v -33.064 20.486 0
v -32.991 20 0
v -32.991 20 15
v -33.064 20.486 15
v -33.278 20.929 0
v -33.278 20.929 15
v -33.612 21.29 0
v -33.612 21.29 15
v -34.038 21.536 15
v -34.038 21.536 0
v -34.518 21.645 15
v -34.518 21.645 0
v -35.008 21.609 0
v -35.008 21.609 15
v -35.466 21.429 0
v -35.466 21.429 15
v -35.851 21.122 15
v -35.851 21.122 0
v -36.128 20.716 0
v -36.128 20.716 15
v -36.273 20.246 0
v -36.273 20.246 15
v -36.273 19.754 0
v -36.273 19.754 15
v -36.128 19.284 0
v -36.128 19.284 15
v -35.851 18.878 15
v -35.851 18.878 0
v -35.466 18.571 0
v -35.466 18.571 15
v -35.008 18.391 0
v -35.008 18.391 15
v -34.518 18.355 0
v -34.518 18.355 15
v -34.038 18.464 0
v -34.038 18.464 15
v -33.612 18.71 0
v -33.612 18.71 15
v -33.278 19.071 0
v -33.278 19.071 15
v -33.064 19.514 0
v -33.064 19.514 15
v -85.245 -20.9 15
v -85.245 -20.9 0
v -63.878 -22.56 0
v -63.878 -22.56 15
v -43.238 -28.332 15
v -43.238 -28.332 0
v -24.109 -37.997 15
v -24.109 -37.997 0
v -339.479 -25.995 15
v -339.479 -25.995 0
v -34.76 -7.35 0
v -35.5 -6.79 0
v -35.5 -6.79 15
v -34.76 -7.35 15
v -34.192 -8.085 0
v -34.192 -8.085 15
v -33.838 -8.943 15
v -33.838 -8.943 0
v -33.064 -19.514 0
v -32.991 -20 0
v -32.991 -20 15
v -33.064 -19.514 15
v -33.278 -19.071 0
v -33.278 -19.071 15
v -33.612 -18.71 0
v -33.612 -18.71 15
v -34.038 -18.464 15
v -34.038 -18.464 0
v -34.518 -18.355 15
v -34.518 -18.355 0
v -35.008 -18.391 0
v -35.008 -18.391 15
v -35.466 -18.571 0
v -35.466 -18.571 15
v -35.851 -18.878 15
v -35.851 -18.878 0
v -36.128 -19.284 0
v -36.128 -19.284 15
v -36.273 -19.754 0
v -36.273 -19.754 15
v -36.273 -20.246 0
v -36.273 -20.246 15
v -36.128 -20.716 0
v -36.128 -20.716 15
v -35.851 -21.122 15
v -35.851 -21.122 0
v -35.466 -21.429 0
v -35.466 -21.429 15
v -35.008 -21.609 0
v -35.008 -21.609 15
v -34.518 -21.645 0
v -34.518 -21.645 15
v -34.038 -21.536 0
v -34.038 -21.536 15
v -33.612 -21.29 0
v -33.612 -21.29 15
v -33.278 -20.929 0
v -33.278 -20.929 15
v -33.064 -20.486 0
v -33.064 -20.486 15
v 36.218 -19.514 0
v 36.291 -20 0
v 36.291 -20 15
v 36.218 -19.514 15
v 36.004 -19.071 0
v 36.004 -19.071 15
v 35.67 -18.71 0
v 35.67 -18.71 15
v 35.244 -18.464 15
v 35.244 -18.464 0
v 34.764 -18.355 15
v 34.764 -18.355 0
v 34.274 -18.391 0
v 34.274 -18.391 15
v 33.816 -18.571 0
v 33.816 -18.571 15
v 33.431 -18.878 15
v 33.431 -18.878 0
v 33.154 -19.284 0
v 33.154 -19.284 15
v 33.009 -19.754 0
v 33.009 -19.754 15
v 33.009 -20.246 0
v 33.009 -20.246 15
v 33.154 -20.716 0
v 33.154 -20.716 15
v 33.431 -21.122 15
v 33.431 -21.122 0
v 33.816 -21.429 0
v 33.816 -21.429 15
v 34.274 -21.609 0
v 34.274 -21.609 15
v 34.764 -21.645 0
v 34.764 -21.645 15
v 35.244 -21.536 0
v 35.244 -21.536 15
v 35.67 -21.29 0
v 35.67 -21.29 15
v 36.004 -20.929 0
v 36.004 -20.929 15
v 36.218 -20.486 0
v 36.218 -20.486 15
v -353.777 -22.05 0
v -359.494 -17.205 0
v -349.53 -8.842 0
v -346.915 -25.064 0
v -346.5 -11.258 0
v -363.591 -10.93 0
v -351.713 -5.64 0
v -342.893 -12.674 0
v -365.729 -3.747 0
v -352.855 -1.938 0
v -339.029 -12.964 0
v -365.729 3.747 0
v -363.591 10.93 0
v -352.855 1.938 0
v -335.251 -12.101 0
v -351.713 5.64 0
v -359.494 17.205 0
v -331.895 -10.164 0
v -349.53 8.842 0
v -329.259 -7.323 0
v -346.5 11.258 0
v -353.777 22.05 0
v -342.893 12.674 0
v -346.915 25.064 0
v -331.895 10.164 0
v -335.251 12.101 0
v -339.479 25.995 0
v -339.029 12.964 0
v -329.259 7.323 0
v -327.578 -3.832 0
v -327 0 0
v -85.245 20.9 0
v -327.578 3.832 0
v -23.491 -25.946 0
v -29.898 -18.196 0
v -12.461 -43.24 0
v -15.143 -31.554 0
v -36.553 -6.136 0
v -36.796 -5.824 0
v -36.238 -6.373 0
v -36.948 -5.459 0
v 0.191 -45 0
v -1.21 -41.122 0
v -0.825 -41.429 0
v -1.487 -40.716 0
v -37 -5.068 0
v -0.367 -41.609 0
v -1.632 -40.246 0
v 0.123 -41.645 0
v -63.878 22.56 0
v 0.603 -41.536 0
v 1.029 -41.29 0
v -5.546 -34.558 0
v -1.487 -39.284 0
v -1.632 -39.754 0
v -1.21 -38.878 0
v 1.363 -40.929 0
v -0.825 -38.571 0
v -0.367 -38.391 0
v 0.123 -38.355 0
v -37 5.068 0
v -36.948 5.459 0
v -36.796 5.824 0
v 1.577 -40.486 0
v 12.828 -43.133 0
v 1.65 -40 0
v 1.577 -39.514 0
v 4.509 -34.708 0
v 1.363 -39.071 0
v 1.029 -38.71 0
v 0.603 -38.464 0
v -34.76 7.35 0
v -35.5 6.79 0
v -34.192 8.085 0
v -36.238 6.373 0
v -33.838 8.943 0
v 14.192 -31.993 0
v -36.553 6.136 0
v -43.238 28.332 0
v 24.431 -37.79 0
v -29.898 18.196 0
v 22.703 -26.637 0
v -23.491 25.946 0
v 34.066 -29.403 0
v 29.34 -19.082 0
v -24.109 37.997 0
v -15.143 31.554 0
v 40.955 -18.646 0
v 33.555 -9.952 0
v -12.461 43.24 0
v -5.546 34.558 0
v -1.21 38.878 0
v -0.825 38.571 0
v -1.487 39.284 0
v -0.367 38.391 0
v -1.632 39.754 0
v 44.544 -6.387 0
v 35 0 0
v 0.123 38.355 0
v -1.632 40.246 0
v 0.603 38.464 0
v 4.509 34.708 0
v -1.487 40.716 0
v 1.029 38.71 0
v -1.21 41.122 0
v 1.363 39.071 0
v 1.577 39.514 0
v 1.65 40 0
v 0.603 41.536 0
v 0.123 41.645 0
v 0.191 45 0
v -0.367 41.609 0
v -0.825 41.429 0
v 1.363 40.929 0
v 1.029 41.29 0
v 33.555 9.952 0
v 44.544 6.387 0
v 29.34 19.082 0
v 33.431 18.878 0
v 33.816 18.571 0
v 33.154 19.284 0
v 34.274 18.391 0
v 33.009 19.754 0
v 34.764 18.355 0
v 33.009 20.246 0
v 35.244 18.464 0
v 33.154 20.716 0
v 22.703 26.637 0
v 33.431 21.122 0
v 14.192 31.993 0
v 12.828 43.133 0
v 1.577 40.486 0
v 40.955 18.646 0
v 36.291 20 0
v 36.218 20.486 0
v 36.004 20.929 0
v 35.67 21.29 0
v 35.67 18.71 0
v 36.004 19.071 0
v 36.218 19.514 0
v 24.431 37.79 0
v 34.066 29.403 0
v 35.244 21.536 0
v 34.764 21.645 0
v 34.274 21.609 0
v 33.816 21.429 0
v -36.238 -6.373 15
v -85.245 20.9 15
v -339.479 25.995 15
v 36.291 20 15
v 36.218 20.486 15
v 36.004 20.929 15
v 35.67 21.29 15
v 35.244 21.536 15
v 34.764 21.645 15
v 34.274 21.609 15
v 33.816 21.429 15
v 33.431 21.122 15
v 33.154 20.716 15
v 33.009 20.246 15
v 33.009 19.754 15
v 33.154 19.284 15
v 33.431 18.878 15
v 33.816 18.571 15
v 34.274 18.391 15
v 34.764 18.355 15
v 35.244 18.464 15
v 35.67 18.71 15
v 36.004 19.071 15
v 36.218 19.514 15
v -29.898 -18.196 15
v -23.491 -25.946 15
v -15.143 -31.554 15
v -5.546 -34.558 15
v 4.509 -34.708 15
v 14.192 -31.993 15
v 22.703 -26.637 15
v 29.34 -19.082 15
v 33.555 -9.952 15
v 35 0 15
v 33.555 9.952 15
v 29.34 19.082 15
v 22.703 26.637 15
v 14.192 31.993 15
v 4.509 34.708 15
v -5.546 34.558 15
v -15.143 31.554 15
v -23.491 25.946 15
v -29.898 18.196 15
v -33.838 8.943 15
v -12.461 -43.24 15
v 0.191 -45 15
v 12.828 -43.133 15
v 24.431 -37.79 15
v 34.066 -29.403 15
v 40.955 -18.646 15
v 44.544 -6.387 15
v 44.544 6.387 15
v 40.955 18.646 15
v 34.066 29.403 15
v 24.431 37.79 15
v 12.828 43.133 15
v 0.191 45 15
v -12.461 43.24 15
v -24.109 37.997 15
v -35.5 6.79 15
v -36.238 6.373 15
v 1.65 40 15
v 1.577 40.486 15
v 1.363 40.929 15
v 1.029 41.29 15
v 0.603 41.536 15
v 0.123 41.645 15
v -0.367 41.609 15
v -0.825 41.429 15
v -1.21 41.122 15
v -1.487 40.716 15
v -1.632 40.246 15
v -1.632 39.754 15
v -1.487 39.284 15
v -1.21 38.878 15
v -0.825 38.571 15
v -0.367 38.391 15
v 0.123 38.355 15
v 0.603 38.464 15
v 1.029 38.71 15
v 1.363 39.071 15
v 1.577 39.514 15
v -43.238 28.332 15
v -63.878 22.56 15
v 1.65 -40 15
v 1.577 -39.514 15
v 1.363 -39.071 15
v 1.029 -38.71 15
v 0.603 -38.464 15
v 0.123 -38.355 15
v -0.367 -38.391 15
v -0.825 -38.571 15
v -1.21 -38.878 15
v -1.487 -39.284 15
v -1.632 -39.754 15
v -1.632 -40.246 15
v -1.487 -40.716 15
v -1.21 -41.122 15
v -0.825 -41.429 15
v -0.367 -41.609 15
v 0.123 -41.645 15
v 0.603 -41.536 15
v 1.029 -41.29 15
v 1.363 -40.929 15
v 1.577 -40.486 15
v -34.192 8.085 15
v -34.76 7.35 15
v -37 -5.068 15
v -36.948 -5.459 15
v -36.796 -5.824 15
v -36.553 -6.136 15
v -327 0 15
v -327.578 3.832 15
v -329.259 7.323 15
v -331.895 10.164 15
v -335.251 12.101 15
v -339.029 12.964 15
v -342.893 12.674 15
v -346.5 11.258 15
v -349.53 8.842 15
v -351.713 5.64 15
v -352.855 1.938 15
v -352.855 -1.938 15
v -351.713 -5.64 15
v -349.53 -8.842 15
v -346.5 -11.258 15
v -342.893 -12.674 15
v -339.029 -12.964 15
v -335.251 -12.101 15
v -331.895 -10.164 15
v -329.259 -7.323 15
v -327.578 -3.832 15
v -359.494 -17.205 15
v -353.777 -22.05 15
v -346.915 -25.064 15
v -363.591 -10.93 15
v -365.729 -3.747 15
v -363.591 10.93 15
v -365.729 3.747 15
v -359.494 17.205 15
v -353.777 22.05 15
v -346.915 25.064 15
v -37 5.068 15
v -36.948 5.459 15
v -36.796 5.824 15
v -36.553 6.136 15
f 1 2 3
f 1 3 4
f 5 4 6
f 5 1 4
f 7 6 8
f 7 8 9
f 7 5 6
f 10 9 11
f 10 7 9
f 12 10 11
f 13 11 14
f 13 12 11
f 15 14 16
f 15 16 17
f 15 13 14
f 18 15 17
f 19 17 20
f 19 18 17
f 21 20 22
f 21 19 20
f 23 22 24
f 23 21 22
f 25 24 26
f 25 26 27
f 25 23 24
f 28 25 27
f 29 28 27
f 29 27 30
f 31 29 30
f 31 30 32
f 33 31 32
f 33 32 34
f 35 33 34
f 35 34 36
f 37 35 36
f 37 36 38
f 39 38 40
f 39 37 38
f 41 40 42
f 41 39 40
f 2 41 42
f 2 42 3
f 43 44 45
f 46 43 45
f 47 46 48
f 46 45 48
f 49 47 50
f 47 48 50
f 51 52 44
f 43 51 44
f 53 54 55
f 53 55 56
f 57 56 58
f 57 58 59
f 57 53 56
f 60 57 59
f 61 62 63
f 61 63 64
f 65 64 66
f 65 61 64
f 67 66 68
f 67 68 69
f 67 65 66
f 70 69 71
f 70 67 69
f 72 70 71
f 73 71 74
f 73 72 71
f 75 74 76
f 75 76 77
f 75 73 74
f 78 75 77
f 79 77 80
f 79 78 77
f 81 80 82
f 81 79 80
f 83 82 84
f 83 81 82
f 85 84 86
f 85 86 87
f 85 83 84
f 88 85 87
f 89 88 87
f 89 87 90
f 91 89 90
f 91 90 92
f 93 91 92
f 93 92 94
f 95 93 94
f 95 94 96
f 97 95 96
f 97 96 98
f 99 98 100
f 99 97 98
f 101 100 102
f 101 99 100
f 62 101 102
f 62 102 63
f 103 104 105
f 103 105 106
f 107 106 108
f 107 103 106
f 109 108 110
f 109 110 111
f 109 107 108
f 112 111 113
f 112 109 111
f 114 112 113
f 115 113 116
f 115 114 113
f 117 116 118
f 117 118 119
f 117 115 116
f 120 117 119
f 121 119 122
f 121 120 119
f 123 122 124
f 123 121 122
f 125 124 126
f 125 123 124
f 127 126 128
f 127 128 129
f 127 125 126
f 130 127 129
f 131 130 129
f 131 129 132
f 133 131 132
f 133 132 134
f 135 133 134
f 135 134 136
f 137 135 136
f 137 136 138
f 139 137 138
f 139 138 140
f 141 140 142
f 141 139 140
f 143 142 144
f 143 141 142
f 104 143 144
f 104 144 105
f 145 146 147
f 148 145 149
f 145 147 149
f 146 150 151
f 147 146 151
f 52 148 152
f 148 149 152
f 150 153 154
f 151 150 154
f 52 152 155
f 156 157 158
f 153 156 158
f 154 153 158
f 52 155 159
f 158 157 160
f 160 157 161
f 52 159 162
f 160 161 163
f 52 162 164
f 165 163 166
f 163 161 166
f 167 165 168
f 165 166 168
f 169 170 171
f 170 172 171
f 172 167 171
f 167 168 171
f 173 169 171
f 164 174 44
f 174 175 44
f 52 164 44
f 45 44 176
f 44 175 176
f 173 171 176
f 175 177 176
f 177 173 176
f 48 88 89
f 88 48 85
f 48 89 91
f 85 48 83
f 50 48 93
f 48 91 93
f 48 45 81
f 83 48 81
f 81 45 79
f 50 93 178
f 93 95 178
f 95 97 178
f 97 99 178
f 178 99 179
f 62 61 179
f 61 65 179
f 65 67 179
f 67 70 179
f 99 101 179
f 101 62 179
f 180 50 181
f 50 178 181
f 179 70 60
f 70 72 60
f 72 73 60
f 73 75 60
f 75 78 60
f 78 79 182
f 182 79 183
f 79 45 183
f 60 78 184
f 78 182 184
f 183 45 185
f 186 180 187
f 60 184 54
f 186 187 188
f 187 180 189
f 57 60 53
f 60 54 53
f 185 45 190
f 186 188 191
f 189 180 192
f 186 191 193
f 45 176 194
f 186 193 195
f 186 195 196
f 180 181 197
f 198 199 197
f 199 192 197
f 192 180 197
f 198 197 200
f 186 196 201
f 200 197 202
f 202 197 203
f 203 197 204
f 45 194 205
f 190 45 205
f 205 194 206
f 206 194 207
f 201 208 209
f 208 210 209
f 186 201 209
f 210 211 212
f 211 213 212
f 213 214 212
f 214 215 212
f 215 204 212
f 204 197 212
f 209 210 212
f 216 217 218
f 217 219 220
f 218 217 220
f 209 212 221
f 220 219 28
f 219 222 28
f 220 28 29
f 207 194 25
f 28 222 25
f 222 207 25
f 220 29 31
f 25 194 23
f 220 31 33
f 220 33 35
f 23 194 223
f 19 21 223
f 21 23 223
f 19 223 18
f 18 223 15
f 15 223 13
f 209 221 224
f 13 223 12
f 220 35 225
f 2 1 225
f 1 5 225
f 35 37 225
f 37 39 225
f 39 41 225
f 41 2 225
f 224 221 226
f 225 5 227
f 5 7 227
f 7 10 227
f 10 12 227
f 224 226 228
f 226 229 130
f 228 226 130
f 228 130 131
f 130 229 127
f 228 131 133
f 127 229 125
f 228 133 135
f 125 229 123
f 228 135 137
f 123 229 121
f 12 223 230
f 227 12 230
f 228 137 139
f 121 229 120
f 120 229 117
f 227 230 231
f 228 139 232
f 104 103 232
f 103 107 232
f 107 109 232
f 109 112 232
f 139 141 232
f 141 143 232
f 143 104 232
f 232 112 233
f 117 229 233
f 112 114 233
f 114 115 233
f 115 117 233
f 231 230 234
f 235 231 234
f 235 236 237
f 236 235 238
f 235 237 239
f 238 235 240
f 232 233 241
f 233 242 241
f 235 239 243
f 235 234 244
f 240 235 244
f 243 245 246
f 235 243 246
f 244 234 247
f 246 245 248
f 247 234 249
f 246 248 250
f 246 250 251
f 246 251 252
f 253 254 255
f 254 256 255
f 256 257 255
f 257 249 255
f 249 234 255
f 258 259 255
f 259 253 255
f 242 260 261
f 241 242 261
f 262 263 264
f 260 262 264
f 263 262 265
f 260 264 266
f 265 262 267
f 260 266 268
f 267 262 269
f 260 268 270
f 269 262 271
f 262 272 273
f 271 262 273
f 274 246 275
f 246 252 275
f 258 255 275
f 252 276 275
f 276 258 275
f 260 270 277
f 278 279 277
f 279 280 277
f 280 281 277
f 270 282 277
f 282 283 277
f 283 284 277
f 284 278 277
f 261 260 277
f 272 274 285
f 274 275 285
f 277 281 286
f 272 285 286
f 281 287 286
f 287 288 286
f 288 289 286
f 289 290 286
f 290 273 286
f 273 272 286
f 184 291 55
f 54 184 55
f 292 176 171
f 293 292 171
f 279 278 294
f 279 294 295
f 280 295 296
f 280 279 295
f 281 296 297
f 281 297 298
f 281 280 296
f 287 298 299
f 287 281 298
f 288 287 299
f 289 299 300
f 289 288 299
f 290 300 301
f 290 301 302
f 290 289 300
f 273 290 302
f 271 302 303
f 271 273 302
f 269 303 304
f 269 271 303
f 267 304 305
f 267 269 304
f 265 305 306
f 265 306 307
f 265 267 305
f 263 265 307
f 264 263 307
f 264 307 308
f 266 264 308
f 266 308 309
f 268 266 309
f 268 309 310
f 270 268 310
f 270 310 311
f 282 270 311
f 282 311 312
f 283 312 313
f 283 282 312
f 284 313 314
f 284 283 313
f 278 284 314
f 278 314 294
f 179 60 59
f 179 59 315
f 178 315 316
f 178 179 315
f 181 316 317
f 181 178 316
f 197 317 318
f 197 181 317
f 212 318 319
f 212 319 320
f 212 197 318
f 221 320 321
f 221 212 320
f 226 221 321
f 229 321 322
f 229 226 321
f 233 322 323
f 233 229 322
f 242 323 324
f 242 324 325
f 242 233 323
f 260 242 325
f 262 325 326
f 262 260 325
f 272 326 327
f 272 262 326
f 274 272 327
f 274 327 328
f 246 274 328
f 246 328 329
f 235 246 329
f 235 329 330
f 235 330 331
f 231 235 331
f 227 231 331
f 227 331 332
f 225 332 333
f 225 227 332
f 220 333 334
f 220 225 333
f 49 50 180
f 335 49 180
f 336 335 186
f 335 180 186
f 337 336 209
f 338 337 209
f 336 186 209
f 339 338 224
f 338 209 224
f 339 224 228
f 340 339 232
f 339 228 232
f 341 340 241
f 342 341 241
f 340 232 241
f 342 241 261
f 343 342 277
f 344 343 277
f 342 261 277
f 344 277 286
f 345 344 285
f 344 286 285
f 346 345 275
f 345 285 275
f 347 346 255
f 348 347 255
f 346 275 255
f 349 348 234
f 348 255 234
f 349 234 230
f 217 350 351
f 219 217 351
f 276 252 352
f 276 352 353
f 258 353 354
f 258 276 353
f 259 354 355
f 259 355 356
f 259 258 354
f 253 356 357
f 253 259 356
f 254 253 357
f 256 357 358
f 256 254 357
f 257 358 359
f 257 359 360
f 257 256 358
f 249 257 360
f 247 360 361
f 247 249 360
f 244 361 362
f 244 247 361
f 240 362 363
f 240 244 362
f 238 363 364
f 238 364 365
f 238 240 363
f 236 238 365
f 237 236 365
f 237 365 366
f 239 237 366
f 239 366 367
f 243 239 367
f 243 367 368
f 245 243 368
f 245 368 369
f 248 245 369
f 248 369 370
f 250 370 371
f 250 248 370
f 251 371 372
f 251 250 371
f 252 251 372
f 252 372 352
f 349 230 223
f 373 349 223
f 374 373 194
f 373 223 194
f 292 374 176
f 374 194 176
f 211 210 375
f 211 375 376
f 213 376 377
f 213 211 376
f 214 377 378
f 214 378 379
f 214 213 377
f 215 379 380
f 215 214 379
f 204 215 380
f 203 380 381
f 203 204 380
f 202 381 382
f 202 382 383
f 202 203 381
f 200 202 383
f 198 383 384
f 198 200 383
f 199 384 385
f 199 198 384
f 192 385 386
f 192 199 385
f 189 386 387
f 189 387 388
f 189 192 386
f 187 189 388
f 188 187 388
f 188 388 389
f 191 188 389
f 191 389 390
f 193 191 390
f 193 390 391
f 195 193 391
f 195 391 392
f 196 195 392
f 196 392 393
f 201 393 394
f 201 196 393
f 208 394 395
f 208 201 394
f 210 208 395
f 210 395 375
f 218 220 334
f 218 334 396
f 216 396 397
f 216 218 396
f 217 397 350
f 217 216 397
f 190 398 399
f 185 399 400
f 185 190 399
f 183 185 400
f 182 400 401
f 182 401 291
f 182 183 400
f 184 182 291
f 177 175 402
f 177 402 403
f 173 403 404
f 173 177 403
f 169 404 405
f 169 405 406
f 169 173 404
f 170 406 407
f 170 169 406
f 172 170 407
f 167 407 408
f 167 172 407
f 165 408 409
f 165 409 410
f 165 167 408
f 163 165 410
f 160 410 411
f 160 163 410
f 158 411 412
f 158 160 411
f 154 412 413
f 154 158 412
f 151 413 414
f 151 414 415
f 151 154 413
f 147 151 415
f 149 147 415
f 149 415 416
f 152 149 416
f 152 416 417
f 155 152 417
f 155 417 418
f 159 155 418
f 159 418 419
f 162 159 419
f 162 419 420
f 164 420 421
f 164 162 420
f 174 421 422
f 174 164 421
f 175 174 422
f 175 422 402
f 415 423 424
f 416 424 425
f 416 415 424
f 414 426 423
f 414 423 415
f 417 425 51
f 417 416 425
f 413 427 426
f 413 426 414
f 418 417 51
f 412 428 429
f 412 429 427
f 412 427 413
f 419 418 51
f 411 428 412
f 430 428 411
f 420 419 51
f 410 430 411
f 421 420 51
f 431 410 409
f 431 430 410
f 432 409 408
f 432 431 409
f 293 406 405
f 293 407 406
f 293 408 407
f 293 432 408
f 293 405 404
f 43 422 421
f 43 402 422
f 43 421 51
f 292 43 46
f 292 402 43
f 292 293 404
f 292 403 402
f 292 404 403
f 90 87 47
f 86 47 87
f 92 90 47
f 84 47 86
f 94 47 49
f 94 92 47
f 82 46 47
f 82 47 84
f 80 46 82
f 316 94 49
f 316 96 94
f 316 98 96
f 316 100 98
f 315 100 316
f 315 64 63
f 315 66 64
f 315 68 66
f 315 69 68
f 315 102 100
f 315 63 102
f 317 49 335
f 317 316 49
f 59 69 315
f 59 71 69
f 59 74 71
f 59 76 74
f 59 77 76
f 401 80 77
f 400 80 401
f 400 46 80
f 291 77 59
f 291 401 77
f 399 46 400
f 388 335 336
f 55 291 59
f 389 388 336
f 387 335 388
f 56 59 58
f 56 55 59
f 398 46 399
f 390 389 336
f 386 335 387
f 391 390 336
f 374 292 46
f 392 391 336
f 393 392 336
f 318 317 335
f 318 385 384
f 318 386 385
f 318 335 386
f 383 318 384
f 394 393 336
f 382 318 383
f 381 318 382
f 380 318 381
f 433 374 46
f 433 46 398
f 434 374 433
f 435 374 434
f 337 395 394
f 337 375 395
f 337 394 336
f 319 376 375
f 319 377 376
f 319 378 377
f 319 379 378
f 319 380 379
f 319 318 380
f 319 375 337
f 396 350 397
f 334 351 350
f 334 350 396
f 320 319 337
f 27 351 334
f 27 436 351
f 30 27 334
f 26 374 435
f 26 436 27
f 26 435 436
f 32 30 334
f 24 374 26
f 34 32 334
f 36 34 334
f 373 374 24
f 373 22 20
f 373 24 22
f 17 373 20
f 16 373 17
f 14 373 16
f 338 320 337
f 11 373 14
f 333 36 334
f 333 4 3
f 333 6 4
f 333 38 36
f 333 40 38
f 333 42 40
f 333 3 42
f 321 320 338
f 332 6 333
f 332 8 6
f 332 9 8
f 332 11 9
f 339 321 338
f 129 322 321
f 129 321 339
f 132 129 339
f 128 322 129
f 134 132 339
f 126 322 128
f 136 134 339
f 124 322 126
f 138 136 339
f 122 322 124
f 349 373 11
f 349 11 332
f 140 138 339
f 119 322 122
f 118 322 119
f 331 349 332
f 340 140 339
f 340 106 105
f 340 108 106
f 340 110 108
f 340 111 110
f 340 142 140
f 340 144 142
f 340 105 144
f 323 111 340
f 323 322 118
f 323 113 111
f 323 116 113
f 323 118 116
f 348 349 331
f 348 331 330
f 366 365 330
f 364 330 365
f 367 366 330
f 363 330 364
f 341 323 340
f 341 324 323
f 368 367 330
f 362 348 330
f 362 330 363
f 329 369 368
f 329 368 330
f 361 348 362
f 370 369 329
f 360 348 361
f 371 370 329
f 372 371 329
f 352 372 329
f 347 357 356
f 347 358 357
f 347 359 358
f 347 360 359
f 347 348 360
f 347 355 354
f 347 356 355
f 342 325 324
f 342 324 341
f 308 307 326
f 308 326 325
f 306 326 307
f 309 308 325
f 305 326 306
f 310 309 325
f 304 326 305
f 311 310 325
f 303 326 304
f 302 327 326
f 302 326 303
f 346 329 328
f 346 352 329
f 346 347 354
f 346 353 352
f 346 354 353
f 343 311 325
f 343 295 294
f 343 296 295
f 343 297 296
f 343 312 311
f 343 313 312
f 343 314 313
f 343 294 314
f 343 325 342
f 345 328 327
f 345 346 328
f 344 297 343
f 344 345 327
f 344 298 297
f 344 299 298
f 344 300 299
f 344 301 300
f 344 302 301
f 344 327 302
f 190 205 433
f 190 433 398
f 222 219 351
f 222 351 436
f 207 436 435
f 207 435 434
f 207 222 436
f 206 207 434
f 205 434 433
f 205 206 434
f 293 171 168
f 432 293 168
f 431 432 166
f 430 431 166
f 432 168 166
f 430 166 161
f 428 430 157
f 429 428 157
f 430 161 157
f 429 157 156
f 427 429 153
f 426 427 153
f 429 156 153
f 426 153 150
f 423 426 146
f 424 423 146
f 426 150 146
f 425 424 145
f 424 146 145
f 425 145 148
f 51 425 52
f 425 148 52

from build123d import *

# Parameters (mm, degrees)
SKETCH_1_R      = 1.65
SKETCH_1_R_2    = 13
EXTRUDE_1_DEPTH = 15


with BuildPart() as part:
    # 草图1 → 凸台-拉伸1 (new body)
    with BuildSketch(Plane.XY):
        with BuildLine():
            Line((-85.245113537, 20.900392521), (-339.479111624, 25.994781694))
            ThreePointArc((-339.479111624, 25.994781694), (-366, 0), (-339.479111624, -25.994781694))
            Line((-339.479111624, -25.994781694), (-85.245113537, -20.900392521))
            ThreePointArc((-85.245113537, -20.900392521), (-53.416829007, -24.942544633), (-24.108780491, -37.996930182))
            ThreePointArc((-24.108780491, -37.996930182), (45, 0), (-24.108780491, 37.996930182))
            ThreePointArc((-24.108780491, 37.996930182), (-53.416829007, 24.942544633), (-85.245113537, 20.900392521))
        make_face()
        with Locations((0, 40)):
            Circle(SKETCH_1_R, mode=Mode.SUBTRACT)
        with Locations((34.641016151, 20)):
            Circle(SKETCH_1_R, mode=Mode.SUBTRACT)
        with Locations((34.641016151, -20)):
            Circle(SKETCH_1_R, mode=Mode.SUBTRACT)
        with Locations((0, -40)):
            Circle(SKETCH_1_R, mode=Mode.SUBTRACT)
        with Locations((-34.641016151, 20)):
            Circle(SKETCH_1_R, mode=Mode.SUBTRACT)
        with Locations((-34.641016151, -20)):
            Circle(SKETCH_1_R, mode=Mode.SUBTRACT)
        with Locations((-340, 0)):
            Circle(SKETCH_1_R_2, mode=Mode.SUBTRACT)
        with BuildLine():
            Line((-35.500051413, 6.790401018), (-36.237951224, 6.373427606))
            ThreePointArc((-36.237951224, 6.373427606), (-36.795555255, 5.823507629), (-37, 5.067507244))
            Line((-37, 5.067507244), (-37, -5.067507244))
            ThreePointArc((-37, -5.067507244), (-36.795555255, -5.823507629), (-36.237951224, -6.373427606))
            Line((-36.237951224, -6.373427606), (-35.500051413, -6.790401018))
            ThreePointArc((-35.500051413, -6.790401018), (-34.451431588, -7.698788042), (-33.838125094, -8.943225935))
            ThreePointArc((-33.838125094, -8.943225935), (35, 0), (-33.838125094, 8.943225935))
            ThreePointArc((-33.838125094, 8.943225935), (-34.451431588, 7.698788042), (-35.500051413, 6.790401018))
        make_face(mode=Mode.SUBTRACT)
    extrude(amount=EXTRUDE_1_DEPTH)


solid = part.part
